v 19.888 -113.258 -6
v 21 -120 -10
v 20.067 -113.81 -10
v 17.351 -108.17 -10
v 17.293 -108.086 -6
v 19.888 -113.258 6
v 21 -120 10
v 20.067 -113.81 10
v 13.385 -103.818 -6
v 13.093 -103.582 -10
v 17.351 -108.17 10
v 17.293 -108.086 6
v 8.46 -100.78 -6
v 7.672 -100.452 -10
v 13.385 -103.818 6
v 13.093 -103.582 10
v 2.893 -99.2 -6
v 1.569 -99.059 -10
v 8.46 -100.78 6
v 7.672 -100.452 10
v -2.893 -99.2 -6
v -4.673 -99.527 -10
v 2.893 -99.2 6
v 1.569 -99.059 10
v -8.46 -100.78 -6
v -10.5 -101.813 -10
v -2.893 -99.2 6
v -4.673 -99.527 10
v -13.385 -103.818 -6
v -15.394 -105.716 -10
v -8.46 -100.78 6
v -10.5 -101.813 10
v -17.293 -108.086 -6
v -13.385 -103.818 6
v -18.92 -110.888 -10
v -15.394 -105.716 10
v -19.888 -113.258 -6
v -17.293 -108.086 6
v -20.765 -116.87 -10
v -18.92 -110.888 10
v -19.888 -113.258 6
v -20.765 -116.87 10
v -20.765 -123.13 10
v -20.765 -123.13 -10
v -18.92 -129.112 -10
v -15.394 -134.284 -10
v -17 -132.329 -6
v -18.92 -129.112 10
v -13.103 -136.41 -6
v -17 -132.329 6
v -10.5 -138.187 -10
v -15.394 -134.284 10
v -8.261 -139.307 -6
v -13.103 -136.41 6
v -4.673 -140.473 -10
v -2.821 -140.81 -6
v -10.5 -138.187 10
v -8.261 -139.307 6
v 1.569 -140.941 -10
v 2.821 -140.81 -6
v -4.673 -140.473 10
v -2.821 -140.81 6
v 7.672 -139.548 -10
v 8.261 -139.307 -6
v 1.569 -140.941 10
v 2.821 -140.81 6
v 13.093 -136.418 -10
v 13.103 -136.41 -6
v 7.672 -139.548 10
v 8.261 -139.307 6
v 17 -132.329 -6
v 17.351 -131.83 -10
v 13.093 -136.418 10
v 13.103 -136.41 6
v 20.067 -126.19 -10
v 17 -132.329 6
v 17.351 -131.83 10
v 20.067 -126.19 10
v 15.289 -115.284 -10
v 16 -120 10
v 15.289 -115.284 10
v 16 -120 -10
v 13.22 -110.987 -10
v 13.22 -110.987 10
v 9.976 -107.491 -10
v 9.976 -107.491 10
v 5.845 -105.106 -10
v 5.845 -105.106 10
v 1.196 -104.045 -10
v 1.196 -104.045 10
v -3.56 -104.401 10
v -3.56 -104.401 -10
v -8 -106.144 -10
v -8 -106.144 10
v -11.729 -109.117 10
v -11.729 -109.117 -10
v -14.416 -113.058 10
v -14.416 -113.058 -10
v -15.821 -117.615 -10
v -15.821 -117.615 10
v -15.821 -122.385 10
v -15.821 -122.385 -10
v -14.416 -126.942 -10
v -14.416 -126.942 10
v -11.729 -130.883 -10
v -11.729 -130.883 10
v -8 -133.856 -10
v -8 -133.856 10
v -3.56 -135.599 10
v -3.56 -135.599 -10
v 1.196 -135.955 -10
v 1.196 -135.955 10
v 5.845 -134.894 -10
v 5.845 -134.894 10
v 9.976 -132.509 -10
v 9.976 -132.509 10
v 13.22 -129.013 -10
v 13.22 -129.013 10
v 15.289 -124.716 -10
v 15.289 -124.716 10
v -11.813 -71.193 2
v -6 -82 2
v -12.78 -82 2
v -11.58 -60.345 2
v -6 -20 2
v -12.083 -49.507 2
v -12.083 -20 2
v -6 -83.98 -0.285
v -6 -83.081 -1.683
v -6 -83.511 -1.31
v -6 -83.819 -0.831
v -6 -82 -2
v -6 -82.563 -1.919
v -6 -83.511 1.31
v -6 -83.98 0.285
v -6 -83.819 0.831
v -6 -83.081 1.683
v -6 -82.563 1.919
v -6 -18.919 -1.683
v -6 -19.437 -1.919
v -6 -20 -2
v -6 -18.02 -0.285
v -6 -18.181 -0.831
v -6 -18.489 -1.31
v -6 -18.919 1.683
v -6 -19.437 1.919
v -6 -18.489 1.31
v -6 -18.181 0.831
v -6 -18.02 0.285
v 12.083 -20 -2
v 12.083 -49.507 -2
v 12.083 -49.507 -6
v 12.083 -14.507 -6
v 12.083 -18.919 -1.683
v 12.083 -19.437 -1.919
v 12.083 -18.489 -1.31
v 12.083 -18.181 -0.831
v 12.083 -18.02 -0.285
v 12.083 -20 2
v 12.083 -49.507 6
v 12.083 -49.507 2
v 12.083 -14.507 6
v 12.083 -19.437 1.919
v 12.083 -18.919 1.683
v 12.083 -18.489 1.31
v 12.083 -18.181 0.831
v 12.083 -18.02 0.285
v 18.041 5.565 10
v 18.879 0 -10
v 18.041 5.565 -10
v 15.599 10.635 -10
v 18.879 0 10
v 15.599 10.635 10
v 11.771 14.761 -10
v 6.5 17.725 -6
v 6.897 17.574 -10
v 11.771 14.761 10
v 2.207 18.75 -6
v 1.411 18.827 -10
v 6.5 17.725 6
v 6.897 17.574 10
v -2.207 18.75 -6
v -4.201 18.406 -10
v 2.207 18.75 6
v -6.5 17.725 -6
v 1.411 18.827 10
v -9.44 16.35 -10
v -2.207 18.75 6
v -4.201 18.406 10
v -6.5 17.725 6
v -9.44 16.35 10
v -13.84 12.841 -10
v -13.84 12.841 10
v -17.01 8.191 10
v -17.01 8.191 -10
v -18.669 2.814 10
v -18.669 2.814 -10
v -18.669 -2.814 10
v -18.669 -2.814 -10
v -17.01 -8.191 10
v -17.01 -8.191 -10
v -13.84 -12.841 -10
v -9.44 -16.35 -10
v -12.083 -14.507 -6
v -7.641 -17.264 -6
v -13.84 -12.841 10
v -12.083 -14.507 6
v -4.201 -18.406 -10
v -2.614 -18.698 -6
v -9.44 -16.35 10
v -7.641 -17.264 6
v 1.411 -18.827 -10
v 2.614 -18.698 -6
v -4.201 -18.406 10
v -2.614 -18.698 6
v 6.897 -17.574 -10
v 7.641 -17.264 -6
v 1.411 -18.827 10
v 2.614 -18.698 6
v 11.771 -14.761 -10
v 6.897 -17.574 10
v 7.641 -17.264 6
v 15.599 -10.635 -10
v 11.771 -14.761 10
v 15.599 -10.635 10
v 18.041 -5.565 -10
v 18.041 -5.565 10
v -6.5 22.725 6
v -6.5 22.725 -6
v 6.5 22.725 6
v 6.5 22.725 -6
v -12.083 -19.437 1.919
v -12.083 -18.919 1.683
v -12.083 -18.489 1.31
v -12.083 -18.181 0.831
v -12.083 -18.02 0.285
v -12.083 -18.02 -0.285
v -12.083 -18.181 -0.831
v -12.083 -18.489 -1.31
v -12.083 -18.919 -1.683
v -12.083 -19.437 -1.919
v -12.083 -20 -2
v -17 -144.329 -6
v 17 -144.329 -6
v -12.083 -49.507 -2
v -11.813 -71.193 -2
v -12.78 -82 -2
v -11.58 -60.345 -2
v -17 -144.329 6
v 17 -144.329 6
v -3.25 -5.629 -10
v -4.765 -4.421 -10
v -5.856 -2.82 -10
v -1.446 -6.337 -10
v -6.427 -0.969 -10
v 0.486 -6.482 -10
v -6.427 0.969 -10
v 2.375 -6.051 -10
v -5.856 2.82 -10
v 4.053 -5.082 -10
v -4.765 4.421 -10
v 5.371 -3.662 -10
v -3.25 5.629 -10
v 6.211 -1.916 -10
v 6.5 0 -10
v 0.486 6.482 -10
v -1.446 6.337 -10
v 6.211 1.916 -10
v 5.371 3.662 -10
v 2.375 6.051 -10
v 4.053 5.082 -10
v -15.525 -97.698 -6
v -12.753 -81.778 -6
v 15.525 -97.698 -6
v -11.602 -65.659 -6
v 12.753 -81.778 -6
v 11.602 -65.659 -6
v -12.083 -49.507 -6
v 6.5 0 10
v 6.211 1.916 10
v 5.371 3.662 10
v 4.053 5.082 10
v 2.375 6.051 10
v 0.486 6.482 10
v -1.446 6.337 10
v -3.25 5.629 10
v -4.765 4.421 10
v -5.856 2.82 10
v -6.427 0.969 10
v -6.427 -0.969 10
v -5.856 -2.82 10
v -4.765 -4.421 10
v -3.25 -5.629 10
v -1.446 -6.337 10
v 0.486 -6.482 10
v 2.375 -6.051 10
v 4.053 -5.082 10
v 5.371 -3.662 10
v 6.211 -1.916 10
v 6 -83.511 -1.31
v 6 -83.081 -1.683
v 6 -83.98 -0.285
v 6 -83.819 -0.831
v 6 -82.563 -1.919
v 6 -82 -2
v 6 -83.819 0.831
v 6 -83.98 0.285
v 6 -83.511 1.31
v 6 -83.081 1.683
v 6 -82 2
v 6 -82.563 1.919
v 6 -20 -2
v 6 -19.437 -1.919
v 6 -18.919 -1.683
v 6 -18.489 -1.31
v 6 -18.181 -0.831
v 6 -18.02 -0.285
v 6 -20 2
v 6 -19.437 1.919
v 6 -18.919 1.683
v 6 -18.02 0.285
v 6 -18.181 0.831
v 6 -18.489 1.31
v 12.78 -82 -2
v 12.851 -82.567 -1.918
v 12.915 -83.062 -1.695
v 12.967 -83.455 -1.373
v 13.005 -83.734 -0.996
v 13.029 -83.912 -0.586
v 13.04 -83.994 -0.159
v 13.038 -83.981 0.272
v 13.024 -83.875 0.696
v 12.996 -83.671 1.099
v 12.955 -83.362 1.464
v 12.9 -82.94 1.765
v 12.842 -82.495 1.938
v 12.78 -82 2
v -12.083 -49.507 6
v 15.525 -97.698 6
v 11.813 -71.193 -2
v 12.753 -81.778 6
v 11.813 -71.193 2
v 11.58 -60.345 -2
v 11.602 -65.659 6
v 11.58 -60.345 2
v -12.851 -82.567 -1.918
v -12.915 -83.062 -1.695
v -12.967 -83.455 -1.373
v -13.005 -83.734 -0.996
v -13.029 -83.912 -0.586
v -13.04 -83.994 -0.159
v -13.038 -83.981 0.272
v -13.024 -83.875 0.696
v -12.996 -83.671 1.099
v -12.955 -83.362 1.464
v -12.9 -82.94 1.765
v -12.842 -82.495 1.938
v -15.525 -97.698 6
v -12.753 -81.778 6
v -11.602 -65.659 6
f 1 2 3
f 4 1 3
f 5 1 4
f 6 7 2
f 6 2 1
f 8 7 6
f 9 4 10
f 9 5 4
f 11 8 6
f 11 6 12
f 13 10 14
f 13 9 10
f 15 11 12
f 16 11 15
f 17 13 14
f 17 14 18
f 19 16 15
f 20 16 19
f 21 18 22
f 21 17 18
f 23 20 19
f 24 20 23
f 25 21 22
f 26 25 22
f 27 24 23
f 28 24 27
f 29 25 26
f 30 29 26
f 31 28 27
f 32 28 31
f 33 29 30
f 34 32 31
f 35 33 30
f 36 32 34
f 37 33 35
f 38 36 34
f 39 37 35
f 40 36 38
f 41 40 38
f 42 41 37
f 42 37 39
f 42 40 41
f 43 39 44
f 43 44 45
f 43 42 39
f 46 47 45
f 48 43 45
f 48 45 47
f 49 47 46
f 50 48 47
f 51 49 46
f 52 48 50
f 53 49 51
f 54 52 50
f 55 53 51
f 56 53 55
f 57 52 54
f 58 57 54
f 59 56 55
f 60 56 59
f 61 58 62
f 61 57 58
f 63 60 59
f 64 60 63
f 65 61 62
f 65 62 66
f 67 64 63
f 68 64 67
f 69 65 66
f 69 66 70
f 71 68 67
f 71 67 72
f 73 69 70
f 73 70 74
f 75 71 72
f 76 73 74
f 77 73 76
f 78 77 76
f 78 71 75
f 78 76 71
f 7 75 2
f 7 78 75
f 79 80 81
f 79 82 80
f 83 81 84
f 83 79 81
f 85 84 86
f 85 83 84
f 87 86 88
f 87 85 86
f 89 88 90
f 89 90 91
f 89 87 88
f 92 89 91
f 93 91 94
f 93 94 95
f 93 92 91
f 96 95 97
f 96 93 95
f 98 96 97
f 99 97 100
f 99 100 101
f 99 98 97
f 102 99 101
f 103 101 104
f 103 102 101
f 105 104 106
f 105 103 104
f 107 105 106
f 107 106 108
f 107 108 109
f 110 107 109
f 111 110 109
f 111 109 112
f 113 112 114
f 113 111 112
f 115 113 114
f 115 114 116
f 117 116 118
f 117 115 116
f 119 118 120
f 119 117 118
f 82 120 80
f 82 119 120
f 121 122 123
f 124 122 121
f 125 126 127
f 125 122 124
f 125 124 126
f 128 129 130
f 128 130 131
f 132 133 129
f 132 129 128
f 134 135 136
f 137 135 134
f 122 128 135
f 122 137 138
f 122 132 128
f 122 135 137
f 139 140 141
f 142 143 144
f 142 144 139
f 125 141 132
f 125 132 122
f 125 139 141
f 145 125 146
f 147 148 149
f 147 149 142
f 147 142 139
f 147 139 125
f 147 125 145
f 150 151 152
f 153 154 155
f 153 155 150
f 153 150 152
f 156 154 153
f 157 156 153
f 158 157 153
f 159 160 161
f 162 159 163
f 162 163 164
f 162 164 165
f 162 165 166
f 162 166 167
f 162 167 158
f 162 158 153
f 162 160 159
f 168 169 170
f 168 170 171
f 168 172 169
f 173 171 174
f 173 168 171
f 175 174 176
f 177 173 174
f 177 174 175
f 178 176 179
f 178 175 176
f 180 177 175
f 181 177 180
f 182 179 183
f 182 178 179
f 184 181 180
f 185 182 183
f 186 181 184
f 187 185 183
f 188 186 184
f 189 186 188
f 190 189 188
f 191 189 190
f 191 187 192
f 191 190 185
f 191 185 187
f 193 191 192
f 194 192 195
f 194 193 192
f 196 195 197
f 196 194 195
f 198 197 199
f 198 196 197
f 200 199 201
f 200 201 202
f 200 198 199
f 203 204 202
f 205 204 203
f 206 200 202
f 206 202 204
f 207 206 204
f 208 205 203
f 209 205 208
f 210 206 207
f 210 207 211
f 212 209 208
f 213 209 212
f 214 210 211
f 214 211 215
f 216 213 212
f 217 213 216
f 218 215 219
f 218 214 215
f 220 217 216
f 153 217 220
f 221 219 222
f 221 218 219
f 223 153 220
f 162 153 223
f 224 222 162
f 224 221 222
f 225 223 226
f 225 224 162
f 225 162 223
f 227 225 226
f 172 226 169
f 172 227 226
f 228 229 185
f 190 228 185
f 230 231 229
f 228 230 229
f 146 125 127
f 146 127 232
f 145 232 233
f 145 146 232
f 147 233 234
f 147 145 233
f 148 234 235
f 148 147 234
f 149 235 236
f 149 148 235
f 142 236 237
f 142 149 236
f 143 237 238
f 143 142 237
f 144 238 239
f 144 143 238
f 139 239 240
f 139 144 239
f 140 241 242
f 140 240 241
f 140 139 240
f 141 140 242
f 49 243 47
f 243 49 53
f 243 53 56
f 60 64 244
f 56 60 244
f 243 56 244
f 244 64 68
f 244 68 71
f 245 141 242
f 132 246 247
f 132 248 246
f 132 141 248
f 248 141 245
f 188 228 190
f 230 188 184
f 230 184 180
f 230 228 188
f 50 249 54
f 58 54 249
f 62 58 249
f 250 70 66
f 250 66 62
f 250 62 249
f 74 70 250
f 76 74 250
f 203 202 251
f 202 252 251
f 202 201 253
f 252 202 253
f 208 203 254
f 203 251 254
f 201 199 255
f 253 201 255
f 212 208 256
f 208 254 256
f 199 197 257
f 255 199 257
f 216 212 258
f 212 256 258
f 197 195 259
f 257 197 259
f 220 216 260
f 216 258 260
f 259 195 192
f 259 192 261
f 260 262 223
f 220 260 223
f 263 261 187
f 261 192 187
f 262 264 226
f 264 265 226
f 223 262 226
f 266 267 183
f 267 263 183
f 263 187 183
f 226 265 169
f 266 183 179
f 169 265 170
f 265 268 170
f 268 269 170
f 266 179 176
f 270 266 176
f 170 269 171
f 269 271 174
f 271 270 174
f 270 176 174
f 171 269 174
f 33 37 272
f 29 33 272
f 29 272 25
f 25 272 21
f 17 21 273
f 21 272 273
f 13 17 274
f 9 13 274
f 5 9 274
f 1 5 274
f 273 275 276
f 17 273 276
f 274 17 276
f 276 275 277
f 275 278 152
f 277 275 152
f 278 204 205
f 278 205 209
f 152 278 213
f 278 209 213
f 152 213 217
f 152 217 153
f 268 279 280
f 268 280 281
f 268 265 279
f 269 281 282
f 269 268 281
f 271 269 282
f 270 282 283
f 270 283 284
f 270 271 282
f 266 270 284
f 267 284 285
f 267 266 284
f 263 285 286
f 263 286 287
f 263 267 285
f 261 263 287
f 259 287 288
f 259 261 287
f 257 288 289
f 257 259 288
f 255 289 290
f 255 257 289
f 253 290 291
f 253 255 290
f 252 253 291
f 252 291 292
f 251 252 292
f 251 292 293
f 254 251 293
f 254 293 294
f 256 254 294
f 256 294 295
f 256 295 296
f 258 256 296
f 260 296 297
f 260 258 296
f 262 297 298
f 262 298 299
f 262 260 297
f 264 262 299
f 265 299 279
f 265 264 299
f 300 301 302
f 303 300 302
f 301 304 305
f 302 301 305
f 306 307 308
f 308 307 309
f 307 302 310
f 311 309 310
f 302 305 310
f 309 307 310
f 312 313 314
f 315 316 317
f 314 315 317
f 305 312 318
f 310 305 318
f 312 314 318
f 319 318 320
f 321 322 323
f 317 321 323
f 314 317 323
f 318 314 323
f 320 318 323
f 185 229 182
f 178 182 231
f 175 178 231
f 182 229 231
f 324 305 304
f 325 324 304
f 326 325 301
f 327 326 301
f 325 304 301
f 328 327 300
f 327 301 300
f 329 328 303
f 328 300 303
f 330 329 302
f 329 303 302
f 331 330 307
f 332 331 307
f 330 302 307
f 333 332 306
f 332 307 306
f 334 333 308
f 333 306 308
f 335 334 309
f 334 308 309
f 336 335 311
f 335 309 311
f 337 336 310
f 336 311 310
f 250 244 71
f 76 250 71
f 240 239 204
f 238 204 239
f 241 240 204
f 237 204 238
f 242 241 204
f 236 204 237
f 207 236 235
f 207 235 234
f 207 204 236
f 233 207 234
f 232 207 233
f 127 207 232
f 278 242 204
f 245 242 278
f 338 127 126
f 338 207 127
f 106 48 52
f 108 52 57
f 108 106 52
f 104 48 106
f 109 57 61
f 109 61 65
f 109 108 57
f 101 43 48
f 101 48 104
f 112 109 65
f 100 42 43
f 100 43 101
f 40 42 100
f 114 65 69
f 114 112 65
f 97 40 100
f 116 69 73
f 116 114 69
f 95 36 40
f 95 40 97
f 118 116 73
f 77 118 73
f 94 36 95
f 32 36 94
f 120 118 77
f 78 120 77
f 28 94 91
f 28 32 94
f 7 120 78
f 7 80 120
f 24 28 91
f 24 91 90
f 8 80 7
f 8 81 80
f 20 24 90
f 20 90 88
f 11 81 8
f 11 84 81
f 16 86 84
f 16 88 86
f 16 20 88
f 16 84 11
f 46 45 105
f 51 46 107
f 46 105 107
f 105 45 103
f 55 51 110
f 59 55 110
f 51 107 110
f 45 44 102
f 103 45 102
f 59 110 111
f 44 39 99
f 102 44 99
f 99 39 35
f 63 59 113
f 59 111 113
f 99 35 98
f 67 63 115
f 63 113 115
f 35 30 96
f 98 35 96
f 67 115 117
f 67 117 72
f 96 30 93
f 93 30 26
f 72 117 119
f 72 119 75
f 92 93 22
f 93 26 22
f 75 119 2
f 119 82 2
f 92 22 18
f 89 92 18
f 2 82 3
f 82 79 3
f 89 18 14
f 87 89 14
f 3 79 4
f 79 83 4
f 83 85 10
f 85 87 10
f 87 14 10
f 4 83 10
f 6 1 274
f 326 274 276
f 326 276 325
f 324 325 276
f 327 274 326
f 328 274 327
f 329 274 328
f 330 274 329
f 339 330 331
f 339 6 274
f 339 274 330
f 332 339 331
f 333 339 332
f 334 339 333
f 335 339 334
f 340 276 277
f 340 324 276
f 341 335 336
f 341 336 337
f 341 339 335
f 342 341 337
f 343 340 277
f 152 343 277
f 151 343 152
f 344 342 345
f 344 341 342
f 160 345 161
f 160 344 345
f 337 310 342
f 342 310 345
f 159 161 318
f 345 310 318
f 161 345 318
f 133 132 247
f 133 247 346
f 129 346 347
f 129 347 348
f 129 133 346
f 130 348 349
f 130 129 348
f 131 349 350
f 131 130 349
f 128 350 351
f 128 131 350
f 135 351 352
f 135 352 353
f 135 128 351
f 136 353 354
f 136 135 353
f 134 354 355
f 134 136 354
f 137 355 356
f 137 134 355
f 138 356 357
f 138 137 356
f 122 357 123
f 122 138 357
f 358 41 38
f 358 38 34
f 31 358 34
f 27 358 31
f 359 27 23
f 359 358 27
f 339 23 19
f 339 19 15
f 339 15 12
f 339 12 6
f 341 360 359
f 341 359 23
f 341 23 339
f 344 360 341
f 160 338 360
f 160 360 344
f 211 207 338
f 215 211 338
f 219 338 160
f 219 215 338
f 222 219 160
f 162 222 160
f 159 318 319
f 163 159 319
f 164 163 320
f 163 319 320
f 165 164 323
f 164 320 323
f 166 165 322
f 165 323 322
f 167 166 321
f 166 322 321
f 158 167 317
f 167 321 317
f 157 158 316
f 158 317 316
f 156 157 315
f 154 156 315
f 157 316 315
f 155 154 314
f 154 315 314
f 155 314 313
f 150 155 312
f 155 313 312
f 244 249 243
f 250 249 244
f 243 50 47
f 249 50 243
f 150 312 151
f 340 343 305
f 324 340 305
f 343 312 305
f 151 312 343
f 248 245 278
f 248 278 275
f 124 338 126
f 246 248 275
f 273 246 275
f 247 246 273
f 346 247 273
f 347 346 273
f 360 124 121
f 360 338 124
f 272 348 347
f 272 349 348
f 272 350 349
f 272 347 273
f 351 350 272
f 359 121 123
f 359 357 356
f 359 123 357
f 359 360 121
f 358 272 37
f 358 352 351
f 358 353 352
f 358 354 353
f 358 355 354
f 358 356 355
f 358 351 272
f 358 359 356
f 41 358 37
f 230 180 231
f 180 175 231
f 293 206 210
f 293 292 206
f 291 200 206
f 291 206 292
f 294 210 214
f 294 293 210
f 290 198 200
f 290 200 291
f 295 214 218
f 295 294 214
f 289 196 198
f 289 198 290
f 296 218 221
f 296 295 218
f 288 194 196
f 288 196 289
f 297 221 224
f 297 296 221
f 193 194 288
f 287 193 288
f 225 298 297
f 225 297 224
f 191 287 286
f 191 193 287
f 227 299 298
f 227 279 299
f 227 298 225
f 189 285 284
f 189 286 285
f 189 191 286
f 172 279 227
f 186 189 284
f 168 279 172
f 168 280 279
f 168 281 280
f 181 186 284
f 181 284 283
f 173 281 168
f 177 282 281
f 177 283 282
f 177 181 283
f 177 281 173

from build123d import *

# Parameters (mm, degrees)
IZIM2_R                       = 18.879465786
IZIM2_R_2                     = 6.5
Y_KSEKLIK_EKSTR_ZYON1_DEPTH   = 10
IZIM2_R_3                     = 21
IZIM2_R_4                     = 16
Y_KSEKLIK_EKSTR_ZYON1_2_DEPTH = 10
Y_KSEKLIK_EKSTR_ZYON3_DEPTH   = 6
Y_KSEKLIK_EKSTR_ZYON4_DEPTH   = 6
KES_EKSTR_ZYON1_START         = 6
KES_EKSTR_ZYON1_DEPTH         = 16


with BuildPart() as part:
    # Çizim2 → Yükseklik-Ekstrüzyon1 (new body, symmetric)
    with BuildSketch(Plane.XY):
        Circle(IZIM2_R)
        Circle(IZIM2_R_2, mode=Mode.SUBTRACT)
    extrude(amount=Y_KSEKLIK_EKSTR_ZYON1_DEPTH, both=True)



with BuildPart() as body_2:
    # Çizim2 → Y_kseklik-Ekstr_zyon1 2 (new body, symmetric)
    with BuildSketch(Plane.XY):
        with Locations((0, -120)):
            Circle(IZIM2_R_3)
        with Locations((0, -120)):
            Circle(IZIM2_R_4, mode=Mode.SUBTRACT)
    extrude(amount=Y_KSEKLIK_EKSTR_ZYON1_2_DEPTH, both=True)


with BuildPart() as part_1:
    add(part.part)

    add(body_2.part)  # Yükseklik-Ekstrüzyon3 merges body 2
    # Çizim2<8> → Yükseklik-Ekstrüzyon3 (add, symmetric)
    with BuildSketch(Plane.XY):
        with BuildLine():
            ThreePointArc((12.082858103, -14.506507796), (0, -18.879465786), (-12.082858103, -14.506507796))
            Line((-12.082858103, -14.506507796), (-12.082858103, -49.506507796))
            ThreePointArc((-12.082858103, -49.506507796), (-12.752926263, -81.777932893), (-19.888250818, -113.257783792))
            ThreePointArc((-19.888250818, -113.257783792), (0, -99), (19.888250818, -113.257783792))
            ThreePointArc((19.888250818, -113.257783792), (12.752926263, -81.777932893), (12.082858103, -49.506507796))
            Line((12.082858103, -49.506507796), (12.082858103, -14.506507796))
        make_face()
    extrude(amount=Y_KSEKLIK_EKSTR_ZYON3_DEPTH, both=True)

    # Çizim2<9> → Yükseklik-Ekstrüzyon4 (add, symmetric)
    with BuildSketch(Plane.XY):
        with BuildLine():
            Line((-6.5, 22.725242689), (-6.5, 17.725242689))
            ThreePointArc((-6.5, 17.725242689), (0, 18.879465786), (6.5, 17.725242689))
            Line((6.5, 17.725242689), (6.5, 22.725242689))
            Line((6.5, 22.725242689), (-6.5, 22.725242689))
        make_face()
        with BuildLine():
            ThreePointArc((17, -132.328828006), (0, -141), (-17, -132.328828006))
            Line((-17, -132.328828006), (-17, -144.328828006))
            Line((-17, -144.328828006), (17, -144.328828006))
            Line((17, -144.328828006), (17, -132.328828006))
        make_face()
    extrude(amount=Y_KSEKLIK_EKSTR_ZYON4_DEPTH, both=True)

    # Çizim4 → Kes-Ekstrüzyon1 (cut, through all)
    with BuildSketch(Plane(origin=(0, 0, 0), x_dir=(0, 0, -1), z_dir=(1, 0, 0)).offset(KES_EKSTR_ZYON1_START)):
        with BuildLine():
            Line((2, -20), (2, -82))
            ThreePointArc((2, -82), (0, -84), (-2, -82))
            Line((-2, -82), (-2, -20))
            ThreePointArc((-2, -20), (0, -18), (2, -20))
        make_face()
    kes_ekstr_zyon1 = extrude(amount=KES_EKSTR_ZYON1_DEPTH, mode=Mode.SUBTRACT)

    # Aynalama1: Kes-Ekstrüzyon1 across plane
    add(kes_ekstr_zyon1.mirror(Plane(origin=(0, 0, 0), x_dir=(0, 0, 1), z_dir=(1, 0, 0))), mode=Mode.SUBTRACT)


solid = part_1.part
